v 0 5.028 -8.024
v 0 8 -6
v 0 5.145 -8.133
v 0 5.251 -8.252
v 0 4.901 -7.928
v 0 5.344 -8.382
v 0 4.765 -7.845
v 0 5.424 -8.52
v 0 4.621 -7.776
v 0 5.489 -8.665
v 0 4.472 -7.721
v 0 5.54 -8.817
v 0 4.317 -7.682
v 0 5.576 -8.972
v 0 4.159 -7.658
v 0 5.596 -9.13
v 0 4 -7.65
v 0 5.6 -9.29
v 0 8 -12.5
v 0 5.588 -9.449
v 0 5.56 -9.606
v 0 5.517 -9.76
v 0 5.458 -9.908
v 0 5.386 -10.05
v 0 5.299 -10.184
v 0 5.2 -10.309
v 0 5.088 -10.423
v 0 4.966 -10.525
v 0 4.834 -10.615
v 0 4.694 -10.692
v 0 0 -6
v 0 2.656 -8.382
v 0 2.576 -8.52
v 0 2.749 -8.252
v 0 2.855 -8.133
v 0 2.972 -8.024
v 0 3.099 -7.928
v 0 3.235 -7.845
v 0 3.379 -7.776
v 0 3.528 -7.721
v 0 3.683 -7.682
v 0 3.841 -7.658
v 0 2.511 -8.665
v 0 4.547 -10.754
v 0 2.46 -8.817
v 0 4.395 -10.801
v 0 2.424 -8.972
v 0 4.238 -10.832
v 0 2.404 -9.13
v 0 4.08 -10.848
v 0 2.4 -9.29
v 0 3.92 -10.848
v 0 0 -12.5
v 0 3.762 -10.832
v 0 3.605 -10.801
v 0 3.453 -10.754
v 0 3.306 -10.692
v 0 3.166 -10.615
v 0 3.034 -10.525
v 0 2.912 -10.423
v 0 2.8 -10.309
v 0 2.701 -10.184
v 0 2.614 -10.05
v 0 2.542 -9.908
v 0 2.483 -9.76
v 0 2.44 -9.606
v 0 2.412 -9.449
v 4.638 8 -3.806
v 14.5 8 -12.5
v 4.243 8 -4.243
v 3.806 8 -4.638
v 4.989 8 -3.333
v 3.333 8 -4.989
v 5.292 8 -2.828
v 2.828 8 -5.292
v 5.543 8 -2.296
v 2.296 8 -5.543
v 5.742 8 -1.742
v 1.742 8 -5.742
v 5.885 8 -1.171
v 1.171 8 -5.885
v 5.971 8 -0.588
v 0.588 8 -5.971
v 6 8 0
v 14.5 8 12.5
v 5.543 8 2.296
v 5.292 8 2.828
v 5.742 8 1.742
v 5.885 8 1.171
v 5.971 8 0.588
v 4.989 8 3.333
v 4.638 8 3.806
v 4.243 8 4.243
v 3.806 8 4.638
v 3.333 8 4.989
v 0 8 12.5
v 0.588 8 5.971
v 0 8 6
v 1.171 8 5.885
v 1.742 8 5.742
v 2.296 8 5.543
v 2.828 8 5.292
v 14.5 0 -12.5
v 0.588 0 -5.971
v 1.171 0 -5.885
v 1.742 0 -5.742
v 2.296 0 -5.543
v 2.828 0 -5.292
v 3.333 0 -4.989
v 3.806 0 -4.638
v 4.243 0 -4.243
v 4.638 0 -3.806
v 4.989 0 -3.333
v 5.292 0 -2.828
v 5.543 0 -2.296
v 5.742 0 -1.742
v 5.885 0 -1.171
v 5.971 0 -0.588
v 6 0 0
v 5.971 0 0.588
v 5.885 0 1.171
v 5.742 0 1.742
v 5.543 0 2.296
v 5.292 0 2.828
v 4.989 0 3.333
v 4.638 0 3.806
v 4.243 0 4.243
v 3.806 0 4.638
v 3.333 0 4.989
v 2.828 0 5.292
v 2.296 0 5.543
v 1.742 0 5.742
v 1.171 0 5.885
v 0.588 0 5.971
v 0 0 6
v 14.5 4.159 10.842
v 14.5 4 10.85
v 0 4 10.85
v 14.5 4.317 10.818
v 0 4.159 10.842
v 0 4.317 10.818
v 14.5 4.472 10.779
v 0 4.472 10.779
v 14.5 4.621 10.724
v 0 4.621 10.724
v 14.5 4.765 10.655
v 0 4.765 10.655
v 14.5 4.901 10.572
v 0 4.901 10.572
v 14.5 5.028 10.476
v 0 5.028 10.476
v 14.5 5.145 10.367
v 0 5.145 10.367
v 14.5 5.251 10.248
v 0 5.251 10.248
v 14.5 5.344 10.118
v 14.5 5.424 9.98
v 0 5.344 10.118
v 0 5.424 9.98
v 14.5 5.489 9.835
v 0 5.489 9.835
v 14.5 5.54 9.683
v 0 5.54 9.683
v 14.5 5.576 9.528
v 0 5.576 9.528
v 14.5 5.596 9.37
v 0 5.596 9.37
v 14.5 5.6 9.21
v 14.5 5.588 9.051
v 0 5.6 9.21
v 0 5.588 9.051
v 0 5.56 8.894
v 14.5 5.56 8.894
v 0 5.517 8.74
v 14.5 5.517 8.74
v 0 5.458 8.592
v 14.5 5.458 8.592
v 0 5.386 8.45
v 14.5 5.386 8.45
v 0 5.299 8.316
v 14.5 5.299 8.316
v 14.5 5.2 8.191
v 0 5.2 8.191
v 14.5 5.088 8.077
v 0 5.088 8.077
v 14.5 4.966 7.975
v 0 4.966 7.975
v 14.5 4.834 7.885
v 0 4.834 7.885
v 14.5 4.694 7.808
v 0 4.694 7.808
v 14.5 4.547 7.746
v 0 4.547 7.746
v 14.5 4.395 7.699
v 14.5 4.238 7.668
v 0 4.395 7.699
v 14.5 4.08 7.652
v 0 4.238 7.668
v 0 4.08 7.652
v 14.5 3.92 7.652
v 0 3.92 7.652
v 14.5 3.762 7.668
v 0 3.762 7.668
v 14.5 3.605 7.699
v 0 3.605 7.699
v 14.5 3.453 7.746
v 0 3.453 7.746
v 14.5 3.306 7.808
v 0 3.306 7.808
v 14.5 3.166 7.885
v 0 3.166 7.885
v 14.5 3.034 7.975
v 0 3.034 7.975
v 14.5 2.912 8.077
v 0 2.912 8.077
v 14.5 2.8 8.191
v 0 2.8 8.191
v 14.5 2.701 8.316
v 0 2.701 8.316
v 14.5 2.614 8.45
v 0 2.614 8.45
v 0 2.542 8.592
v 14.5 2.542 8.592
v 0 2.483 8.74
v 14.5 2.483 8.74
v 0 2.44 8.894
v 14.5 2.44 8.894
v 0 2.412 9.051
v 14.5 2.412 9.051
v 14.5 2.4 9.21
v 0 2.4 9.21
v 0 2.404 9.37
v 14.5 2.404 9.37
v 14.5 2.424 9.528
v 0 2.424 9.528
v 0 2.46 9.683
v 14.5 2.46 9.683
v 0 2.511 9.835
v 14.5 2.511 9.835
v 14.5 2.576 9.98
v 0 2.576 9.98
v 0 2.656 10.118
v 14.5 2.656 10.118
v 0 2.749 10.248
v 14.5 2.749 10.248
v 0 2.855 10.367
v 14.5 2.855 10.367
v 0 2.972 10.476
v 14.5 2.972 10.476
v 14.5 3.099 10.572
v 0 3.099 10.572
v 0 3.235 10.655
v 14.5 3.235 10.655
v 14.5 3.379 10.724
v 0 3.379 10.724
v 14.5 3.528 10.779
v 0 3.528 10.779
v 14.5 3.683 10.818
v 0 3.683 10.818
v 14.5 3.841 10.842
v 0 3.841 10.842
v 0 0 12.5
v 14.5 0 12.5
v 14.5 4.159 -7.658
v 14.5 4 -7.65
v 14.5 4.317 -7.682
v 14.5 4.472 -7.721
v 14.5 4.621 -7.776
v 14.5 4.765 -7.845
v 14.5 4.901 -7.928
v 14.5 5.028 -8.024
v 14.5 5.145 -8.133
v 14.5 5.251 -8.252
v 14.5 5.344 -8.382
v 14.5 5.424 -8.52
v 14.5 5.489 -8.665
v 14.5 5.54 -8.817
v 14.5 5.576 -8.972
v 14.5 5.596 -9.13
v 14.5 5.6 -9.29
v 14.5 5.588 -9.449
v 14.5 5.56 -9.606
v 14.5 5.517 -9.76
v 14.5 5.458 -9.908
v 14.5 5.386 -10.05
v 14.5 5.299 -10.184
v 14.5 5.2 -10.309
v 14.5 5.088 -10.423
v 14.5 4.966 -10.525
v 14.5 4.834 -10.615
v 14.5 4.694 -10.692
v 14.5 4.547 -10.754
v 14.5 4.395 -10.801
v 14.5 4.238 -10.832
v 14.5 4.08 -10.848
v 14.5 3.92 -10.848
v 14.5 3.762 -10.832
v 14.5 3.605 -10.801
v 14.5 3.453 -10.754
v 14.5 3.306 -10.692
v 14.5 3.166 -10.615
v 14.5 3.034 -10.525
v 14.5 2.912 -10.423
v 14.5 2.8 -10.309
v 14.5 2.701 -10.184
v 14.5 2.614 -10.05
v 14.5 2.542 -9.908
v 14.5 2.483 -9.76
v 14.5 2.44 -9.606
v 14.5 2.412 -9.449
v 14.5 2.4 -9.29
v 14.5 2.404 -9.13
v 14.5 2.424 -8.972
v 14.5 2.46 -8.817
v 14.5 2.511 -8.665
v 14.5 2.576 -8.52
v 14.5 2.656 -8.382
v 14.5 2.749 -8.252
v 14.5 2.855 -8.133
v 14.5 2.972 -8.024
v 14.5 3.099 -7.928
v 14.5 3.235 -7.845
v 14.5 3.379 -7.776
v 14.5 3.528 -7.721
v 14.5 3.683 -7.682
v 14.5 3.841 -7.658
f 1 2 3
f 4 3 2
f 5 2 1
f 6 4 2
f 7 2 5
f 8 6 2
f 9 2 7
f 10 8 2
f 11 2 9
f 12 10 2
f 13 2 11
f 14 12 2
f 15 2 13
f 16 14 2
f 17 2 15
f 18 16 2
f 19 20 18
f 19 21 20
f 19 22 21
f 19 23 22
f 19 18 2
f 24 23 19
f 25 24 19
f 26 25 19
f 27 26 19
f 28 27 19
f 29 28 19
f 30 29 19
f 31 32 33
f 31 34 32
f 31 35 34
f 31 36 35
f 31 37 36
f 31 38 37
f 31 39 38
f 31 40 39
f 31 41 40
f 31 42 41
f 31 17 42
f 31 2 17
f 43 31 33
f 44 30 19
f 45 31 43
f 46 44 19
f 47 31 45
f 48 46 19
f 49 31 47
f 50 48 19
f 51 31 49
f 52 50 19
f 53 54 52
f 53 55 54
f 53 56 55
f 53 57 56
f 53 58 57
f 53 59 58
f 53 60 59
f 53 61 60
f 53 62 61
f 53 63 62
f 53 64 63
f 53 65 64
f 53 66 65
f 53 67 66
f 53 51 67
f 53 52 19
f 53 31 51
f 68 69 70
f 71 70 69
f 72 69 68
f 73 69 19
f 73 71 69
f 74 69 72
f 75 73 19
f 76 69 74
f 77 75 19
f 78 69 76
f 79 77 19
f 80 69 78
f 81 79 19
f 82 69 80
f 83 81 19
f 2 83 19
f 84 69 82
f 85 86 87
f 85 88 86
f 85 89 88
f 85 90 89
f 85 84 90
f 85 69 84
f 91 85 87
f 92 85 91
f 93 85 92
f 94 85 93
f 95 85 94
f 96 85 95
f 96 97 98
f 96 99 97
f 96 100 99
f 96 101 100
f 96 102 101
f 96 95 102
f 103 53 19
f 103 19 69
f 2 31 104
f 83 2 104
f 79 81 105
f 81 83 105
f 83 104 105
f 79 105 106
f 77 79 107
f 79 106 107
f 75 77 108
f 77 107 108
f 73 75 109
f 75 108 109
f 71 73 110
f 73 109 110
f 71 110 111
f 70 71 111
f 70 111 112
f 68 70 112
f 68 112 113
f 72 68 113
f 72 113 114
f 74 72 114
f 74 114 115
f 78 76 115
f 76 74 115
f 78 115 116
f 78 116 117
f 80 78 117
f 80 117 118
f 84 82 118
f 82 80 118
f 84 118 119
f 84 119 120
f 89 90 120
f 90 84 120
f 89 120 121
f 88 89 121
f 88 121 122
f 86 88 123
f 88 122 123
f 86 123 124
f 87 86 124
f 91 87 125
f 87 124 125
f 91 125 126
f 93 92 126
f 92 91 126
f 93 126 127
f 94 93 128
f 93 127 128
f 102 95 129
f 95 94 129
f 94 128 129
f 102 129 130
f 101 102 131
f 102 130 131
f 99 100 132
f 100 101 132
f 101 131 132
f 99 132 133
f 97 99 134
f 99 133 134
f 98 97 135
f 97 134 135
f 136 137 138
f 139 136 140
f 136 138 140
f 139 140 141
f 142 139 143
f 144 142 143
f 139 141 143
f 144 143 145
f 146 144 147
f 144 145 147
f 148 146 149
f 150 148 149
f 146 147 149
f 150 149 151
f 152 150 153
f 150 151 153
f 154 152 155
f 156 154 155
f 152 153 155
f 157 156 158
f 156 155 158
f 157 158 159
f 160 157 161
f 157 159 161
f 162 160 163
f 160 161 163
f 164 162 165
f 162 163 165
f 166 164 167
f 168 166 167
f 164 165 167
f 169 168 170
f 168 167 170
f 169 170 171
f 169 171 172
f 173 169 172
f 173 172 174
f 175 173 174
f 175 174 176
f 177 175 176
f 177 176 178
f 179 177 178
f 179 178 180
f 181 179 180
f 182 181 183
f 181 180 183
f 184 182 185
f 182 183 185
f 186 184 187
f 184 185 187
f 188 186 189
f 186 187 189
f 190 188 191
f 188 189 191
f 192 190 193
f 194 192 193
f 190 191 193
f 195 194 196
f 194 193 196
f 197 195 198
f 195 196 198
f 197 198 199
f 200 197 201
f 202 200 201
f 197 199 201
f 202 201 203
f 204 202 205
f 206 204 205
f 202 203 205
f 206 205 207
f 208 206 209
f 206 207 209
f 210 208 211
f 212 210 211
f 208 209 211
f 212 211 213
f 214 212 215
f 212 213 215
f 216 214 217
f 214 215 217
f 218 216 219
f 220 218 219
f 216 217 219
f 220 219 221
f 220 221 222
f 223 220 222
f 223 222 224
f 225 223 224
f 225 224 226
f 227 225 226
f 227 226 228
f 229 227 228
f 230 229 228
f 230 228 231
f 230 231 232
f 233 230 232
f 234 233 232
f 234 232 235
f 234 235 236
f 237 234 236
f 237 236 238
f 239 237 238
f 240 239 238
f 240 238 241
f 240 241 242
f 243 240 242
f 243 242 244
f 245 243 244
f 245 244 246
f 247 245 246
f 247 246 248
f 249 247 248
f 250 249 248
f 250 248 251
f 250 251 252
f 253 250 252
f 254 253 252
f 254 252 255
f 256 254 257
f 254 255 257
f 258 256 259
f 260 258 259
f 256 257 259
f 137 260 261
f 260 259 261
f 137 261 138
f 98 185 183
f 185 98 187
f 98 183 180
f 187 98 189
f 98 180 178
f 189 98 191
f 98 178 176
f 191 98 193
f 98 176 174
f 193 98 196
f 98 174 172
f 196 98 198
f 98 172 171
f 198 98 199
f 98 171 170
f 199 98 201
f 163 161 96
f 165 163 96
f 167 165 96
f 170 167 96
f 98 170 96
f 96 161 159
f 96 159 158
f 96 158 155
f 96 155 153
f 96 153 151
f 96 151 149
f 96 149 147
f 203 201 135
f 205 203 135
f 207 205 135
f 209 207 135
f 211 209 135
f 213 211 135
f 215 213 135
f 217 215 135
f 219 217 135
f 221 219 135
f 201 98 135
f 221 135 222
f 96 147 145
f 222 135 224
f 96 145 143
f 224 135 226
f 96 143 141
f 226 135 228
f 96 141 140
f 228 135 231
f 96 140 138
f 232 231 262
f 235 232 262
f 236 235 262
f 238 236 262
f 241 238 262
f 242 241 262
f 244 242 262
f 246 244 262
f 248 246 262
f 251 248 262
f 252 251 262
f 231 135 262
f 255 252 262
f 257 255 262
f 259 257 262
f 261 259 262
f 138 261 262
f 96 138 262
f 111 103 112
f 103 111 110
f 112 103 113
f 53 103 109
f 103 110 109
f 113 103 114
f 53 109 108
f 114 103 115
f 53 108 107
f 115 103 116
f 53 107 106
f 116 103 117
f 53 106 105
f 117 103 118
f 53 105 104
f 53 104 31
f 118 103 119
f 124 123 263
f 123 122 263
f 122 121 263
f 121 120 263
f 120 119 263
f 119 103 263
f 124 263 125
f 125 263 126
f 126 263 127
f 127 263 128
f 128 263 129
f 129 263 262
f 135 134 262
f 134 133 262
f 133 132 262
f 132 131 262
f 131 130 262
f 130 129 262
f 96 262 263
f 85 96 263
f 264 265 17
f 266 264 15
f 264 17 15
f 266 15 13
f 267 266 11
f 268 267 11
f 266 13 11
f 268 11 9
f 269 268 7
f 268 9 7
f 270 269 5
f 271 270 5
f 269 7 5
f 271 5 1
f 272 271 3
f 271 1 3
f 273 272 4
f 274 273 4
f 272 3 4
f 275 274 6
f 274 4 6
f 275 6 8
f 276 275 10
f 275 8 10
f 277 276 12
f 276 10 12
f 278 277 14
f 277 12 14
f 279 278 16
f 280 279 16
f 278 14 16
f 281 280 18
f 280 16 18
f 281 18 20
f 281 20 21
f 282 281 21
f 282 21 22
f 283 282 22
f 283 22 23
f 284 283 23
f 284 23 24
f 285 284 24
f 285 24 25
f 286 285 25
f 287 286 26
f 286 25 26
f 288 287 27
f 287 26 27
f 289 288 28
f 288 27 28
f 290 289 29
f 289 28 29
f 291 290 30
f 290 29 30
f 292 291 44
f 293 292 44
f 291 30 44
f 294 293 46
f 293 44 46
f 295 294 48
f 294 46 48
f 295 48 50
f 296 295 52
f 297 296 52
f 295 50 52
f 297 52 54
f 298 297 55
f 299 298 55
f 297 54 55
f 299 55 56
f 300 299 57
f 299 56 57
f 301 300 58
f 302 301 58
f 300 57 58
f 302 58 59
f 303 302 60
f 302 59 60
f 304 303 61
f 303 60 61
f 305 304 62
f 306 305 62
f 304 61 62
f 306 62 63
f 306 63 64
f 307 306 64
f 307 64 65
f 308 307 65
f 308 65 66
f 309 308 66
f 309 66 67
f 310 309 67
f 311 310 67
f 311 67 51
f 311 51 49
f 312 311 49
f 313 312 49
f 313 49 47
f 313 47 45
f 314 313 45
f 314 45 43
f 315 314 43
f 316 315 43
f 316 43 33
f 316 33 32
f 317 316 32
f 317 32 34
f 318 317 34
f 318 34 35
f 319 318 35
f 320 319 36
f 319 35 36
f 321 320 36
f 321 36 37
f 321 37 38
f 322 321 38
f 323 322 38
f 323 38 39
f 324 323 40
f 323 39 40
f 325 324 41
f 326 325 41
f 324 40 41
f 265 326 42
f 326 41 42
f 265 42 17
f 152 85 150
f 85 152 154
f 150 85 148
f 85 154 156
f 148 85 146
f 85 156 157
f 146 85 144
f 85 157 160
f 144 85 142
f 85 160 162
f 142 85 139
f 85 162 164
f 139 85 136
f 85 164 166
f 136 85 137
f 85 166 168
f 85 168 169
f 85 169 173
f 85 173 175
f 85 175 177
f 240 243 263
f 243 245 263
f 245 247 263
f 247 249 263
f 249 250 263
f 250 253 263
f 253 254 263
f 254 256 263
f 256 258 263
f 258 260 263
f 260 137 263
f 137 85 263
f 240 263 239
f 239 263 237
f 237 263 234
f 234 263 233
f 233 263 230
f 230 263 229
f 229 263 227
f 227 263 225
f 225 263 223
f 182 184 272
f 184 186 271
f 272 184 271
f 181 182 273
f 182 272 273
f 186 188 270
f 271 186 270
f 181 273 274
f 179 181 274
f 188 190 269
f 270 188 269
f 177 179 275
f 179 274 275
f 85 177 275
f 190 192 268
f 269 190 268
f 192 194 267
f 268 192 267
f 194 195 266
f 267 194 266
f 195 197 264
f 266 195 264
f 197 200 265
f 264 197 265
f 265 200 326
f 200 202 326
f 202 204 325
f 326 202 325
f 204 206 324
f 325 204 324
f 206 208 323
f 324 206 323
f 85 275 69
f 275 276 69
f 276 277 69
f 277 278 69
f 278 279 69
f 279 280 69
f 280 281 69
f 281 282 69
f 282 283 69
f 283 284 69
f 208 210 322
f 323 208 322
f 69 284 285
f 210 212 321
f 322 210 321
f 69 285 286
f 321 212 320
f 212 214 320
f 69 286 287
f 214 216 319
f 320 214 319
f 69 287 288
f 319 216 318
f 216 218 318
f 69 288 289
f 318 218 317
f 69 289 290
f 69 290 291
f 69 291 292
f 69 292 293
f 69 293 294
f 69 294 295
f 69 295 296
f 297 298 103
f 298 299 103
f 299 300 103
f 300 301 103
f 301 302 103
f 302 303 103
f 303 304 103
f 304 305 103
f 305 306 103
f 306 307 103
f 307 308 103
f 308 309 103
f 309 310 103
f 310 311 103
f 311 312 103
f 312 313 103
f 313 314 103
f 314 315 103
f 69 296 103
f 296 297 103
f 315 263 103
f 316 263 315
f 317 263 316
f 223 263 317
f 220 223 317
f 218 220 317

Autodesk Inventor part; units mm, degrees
ref_plane "YZ Plane" through (0, 0, 0) normal (1, 0, 0) x (0, 1, 0)
ref_plane "XZ Plane" through (0, 0, 0) normal (0, 1, 0) x (-1, 0, 0)
ref_plane "XY Plane" through (0, 0, 0) normal (0, 0, 1) x (1, 0, 0)
sketch "Sketch1" plane through (0, 0, 0) normal (0, 1, 0) x (-1, 0, 0)
  arc A0 (0, 6) -> (0, -6) centre (0, 0) ccw
  line L0 (0, 0) -> (-14.5, 0) construction
  line L1 (0, 6) -> (0, 12.5)
  line L2 (0, 12.5) -> (-14.5, 12.5)
  line L3 (0, -6) -> (0, -12.5)
  line L4 (0, -12.5) -> (-14.5, -12.5)
  line L5 (-14.5, 12.5) -> (-14.5, -12.5)
extrude "Extrusion1" add sketch "Sketch1" along normal blind 8
sketch "Sketch2" plane through (0, 8, 0) normal (0, 1, 0) x (1, 0, 0)
  line L0 (14.5, -12.5) -> (14.5, 12.5) construction
  line L1 (0, 12.5) -> (0, 6) construction
  line L2 (0, -6) -> (0, -12.5) construction
  point P0 (0, 0)
sketch "Sketch3" plane through (0, 0, -12.5) normal (-1, 0, 0) x (0, 0, 1)
  line L0 (0, 8) -> (6.5, 8) construction
  line L1 (3.25, 8) -> (3.25, 0) construction
  line L2 (25, 8) -> (0, 8) construction
  line L3 (18.5, 8) -> (25, 8) construction
  line L4 (21.75, 8) -> (21.75, 0) construction
  line L5 (12.5, 0) -> (12.5, 8) construction
  line L6 (25, 0) -> (25, 8) construction
  line L7 (25, 4) -> (0, 4) construction
  line L8 (0, 0) -> (0, 8) construction
  circle A0 centre (21.75, 4) radius 1.6
  circle A1 centre (3.25, 4) radius 1.6
  dimension "d8" = 3.2
  dimension "d9" = 3.2
extrude "Extrusion2" cut sketch "Sketch3" against normal through all
sketch "Sketch4" plane through (0, 8, 0) normal (0, 1, 0) x (1, 0, 0)
  point P0 (0, 0)
properties part number "Semi Cuscinetto"
